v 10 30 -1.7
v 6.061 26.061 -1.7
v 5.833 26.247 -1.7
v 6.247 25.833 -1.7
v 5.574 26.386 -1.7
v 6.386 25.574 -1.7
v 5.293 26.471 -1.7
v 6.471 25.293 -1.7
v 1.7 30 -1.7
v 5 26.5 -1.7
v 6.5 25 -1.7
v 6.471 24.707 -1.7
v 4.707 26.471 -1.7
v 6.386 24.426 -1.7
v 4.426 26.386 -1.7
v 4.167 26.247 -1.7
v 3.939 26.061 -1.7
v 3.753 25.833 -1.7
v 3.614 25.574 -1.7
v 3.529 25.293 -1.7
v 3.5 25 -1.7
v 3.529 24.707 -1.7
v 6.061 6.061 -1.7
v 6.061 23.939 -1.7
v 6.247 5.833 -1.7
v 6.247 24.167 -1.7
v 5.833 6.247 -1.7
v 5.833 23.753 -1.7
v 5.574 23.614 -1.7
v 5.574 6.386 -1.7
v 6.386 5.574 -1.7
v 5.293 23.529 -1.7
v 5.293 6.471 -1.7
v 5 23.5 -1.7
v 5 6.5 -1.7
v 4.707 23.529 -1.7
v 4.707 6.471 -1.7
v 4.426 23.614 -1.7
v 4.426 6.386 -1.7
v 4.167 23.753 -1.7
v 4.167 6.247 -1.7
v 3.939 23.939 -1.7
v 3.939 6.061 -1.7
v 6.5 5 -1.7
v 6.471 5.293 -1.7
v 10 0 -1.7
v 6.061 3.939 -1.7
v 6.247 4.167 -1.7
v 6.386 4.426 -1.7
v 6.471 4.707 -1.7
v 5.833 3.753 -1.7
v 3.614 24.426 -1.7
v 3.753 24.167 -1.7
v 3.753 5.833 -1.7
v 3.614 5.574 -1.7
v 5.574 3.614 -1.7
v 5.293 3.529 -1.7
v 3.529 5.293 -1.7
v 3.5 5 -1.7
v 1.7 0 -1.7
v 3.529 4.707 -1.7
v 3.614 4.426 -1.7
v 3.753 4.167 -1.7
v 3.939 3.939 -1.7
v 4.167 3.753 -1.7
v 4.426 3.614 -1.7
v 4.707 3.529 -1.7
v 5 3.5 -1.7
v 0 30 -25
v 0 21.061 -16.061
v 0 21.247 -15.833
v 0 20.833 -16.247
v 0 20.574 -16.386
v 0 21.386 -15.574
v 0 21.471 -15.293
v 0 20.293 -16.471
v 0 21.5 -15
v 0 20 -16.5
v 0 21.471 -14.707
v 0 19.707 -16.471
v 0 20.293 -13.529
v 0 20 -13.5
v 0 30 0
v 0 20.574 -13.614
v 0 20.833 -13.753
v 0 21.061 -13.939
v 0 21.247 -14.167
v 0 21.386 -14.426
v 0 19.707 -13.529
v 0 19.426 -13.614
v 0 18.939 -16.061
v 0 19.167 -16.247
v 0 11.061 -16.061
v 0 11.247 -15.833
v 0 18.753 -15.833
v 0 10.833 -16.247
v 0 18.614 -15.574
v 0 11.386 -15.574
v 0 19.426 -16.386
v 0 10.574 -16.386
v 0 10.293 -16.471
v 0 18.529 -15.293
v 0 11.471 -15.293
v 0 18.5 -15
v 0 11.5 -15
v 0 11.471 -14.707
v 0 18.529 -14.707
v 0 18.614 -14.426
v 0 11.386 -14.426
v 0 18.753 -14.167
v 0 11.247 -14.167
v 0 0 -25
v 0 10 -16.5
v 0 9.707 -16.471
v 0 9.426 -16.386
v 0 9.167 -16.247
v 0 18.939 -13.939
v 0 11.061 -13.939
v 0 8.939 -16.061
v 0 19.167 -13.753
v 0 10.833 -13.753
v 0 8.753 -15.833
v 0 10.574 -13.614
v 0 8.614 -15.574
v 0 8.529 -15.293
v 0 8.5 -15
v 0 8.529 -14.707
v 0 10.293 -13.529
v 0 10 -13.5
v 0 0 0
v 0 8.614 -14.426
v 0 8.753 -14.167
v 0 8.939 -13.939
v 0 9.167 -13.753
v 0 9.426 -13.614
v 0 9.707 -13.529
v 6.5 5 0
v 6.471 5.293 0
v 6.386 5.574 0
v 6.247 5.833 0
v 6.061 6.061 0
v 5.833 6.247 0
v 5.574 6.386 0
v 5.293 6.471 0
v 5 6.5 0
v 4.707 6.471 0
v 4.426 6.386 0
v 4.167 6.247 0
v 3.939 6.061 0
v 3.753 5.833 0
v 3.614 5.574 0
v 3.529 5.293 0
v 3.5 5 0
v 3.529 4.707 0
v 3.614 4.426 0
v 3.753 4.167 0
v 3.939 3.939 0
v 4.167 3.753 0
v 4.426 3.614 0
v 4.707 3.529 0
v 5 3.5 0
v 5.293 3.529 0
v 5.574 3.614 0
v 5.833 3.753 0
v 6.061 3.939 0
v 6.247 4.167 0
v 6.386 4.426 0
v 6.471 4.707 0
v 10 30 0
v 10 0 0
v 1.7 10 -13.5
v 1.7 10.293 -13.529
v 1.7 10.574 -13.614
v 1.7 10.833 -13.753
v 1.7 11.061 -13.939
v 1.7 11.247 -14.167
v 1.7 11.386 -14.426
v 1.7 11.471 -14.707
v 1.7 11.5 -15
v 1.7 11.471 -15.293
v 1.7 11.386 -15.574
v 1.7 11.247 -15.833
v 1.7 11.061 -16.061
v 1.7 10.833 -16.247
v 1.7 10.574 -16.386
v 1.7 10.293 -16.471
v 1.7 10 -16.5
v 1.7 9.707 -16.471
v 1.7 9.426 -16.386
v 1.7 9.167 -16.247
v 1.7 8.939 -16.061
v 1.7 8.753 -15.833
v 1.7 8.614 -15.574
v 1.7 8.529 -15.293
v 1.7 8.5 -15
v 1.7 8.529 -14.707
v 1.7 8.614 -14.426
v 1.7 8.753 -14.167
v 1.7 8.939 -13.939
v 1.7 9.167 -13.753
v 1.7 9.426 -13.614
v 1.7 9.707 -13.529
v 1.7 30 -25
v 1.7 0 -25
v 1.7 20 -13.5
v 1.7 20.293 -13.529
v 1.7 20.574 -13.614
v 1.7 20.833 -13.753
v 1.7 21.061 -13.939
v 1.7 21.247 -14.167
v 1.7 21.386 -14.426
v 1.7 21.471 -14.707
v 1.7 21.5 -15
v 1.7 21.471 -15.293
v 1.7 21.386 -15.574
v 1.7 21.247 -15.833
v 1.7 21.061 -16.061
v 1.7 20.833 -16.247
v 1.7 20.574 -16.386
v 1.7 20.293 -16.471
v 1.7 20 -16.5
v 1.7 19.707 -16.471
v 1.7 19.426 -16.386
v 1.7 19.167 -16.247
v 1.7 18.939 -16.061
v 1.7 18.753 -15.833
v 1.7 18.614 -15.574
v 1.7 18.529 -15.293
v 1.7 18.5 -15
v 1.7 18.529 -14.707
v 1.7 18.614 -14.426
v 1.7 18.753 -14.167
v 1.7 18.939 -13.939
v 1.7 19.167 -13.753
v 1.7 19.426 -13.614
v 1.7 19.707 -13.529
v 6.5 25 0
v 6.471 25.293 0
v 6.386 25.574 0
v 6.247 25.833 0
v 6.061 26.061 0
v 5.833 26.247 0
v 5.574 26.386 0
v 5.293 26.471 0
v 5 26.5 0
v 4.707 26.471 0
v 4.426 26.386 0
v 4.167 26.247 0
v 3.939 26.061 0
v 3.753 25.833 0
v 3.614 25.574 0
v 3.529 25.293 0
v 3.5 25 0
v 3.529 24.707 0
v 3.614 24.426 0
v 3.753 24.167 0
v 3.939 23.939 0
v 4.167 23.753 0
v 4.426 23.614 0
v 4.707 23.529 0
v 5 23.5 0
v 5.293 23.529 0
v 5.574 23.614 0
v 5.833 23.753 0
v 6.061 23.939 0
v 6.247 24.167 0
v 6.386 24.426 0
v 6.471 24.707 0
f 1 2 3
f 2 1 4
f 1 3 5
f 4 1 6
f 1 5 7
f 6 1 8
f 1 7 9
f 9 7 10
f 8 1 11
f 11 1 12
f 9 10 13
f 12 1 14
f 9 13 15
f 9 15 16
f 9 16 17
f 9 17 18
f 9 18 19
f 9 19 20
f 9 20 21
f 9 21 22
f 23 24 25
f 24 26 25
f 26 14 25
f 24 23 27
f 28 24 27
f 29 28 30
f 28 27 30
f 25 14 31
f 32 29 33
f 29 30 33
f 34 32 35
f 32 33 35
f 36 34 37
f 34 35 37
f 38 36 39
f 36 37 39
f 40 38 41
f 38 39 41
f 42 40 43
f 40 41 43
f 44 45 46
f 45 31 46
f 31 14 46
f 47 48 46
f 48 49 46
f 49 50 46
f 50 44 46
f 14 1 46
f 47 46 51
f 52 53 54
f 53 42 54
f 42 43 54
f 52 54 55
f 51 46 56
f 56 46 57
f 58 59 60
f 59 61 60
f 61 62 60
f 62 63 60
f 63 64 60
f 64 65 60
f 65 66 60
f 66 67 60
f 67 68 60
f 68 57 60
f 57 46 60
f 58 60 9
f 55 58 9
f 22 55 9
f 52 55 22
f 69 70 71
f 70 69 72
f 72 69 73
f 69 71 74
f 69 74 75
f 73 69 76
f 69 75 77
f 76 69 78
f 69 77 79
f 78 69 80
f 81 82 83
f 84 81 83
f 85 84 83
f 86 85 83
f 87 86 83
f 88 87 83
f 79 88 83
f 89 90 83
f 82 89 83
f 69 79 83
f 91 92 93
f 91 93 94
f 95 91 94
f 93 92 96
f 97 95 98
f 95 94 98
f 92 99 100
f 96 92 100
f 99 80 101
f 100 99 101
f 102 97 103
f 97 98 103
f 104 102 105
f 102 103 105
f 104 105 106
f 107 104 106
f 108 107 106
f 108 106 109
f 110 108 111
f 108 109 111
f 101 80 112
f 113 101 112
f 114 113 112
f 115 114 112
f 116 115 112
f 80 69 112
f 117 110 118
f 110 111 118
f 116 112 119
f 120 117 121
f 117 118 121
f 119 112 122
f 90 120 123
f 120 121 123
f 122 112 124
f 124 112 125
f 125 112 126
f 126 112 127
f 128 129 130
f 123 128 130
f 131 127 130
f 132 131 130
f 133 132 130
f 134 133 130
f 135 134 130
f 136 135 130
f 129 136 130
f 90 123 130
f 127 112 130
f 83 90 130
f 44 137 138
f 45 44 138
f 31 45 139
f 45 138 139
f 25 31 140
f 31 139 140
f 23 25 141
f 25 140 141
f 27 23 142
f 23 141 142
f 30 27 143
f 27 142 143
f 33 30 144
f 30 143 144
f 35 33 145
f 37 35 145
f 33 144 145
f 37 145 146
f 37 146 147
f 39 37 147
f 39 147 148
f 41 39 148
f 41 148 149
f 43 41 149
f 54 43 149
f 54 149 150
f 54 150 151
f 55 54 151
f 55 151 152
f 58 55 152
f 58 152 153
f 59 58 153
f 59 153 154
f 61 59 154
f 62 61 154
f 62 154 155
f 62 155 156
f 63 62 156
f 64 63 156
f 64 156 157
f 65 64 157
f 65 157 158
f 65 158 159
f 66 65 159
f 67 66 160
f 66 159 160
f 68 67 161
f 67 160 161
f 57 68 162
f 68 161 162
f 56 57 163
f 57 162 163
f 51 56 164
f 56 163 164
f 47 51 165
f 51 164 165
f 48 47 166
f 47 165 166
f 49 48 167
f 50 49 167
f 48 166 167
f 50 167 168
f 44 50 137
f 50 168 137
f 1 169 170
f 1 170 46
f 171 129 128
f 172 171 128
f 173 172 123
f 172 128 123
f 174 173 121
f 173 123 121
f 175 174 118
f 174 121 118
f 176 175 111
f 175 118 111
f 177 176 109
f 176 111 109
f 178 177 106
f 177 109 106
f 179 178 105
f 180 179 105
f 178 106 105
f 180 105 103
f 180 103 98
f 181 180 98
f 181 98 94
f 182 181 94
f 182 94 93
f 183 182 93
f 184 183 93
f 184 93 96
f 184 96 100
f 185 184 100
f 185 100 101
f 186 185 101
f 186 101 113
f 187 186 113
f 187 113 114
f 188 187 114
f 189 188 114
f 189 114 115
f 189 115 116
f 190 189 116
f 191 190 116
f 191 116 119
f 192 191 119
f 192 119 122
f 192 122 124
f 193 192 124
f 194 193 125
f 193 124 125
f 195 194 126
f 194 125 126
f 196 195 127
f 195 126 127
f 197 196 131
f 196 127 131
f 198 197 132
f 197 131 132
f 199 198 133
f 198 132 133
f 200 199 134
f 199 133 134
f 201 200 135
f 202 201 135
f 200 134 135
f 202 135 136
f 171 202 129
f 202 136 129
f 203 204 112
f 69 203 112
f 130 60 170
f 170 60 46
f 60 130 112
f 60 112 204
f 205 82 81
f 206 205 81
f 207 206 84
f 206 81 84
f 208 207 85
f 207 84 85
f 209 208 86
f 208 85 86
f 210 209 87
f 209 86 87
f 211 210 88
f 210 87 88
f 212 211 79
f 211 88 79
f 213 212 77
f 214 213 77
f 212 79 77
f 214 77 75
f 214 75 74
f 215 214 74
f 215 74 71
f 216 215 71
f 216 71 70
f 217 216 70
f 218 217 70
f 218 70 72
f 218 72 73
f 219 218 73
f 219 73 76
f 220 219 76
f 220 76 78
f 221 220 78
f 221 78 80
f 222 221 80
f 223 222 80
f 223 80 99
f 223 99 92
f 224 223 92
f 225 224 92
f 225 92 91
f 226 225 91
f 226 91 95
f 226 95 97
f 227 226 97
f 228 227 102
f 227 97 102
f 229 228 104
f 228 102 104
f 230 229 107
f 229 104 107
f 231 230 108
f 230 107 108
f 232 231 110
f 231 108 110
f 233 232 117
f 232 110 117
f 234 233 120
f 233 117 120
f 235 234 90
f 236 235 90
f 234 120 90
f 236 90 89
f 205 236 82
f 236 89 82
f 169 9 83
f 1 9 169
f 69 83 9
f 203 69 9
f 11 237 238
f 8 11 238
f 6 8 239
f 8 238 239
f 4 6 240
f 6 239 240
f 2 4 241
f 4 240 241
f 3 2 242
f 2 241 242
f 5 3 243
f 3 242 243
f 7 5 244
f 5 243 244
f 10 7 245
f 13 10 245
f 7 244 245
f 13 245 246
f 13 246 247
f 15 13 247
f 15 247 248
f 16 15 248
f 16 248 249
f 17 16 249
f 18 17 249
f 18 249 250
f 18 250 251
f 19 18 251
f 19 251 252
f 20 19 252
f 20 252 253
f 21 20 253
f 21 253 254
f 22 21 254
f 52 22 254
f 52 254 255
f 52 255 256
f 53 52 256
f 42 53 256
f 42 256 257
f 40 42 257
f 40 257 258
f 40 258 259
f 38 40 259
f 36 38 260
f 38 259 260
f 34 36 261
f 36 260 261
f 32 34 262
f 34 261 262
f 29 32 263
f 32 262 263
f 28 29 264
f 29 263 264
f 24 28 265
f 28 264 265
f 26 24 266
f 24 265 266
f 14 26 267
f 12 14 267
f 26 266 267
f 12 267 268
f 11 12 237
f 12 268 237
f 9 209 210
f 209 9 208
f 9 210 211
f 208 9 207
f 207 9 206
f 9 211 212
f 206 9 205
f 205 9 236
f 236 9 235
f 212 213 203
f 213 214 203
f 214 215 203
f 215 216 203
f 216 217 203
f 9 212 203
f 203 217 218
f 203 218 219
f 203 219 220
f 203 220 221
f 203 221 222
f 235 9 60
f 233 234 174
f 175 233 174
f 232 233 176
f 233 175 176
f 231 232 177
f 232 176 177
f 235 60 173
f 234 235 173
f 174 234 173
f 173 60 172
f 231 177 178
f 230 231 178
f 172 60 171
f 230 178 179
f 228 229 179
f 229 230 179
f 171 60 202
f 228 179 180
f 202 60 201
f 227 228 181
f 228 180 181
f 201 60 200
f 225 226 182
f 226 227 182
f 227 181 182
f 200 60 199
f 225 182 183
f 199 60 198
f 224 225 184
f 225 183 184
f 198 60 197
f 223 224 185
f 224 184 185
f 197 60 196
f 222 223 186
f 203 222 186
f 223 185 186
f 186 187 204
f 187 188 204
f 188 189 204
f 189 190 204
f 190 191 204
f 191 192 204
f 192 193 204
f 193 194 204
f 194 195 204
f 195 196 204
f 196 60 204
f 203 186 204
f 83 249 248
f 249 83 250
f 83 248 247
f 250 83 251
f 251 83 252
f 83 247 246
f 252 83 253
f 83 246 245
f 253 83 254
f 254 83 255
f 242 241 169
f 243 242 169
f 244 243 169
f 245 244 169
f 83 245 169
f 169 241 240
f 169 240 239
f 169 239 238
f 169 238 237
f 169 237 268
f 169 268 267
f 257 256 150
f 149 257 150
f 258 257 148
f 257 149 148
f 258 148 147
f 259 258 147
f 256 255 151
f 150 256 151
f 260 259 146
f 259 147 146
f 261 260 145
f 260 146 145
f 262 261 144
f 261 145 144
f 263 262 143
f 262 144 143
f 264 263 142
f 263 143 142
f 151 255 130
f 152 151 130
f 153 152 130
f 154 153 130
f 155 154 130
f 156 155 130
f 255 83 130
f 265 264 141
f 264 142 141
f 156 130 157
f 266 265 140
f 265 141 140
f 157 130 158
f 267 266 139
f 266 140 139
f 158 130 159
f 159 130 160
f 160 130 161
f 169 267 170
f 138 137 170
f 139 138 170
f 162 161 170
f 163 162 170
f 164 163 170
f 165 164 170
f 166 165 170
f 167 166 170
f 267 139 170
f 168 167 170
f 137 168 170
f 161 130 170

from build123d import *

# Parameters (mm, degrees)
EXTRUDE_THIN1_DEPTH = 30
SKETCH10_R          = 1.5
CUT_EXTRUDE1_DEPTH  = 10
SKETCH11_R          = 1.5
CUT_EXTRUDE2_DEPTH  = 10
SKETCH12_W          = 15
SKETCH12_H          = 1.7
CUT_EXTRUDE3_DEPTH  = 40


with BuildPart() as part:
    # Sketch9 → Extrude-Thin1 (new body)
    with BuildSketch(Plane(origin=(0, 0, 0), x_dir=(1, 0, 0), z_dir=(0, 1, 0))):
        Polygon((0, 25), (0, 0), (25, 0), (25, 1.7), (1.7, 1.7), (1.7, 25), align=None)
    extrude(amount=EXTRUDE_THIN1_DEPTH)

    # Sketch10 → Cut-Extrude1 (cut)
    with BuildSketch(Plane.XY):
        with Locations((5, 25)):
            Circle(SKETCH10_R)
        with Locations((5, 5)):
            Circle(SKETCH10_R)
    extrude(amount=-CUT_EXTRUDE1_DEPTH, mode=Mode.SUBTRACT)

    # Sketch11 → Cut-Extrude2 (cut)
    with BuildSketch(Plane.ZY):
        with Locations((-15, 10)):
            Circle(SKETCH11_R)
        with Locations((-15, 20)):
            Circle(SKETCH11_R)
    extrude(amount=-CUT_EXTRUDE2_DEPTH, mode=Mode.SUBTRACT)

    # Sketch12 → Cut-Extrude3 (cut)
    with BuildSketch(Plane(origin=(0, 30, 0), x_dir=(1, 0, 0), z_dir=(0, 1, 0))):
        with Locations((17.5, 0.85)):
            Rectangle(SKETCH12_W, SKETCH12_H)
    extrude(amount=-CUT_EXTRUDE3_DEPTH, mode=Mode.SUBTRACT)


solid = part.part
